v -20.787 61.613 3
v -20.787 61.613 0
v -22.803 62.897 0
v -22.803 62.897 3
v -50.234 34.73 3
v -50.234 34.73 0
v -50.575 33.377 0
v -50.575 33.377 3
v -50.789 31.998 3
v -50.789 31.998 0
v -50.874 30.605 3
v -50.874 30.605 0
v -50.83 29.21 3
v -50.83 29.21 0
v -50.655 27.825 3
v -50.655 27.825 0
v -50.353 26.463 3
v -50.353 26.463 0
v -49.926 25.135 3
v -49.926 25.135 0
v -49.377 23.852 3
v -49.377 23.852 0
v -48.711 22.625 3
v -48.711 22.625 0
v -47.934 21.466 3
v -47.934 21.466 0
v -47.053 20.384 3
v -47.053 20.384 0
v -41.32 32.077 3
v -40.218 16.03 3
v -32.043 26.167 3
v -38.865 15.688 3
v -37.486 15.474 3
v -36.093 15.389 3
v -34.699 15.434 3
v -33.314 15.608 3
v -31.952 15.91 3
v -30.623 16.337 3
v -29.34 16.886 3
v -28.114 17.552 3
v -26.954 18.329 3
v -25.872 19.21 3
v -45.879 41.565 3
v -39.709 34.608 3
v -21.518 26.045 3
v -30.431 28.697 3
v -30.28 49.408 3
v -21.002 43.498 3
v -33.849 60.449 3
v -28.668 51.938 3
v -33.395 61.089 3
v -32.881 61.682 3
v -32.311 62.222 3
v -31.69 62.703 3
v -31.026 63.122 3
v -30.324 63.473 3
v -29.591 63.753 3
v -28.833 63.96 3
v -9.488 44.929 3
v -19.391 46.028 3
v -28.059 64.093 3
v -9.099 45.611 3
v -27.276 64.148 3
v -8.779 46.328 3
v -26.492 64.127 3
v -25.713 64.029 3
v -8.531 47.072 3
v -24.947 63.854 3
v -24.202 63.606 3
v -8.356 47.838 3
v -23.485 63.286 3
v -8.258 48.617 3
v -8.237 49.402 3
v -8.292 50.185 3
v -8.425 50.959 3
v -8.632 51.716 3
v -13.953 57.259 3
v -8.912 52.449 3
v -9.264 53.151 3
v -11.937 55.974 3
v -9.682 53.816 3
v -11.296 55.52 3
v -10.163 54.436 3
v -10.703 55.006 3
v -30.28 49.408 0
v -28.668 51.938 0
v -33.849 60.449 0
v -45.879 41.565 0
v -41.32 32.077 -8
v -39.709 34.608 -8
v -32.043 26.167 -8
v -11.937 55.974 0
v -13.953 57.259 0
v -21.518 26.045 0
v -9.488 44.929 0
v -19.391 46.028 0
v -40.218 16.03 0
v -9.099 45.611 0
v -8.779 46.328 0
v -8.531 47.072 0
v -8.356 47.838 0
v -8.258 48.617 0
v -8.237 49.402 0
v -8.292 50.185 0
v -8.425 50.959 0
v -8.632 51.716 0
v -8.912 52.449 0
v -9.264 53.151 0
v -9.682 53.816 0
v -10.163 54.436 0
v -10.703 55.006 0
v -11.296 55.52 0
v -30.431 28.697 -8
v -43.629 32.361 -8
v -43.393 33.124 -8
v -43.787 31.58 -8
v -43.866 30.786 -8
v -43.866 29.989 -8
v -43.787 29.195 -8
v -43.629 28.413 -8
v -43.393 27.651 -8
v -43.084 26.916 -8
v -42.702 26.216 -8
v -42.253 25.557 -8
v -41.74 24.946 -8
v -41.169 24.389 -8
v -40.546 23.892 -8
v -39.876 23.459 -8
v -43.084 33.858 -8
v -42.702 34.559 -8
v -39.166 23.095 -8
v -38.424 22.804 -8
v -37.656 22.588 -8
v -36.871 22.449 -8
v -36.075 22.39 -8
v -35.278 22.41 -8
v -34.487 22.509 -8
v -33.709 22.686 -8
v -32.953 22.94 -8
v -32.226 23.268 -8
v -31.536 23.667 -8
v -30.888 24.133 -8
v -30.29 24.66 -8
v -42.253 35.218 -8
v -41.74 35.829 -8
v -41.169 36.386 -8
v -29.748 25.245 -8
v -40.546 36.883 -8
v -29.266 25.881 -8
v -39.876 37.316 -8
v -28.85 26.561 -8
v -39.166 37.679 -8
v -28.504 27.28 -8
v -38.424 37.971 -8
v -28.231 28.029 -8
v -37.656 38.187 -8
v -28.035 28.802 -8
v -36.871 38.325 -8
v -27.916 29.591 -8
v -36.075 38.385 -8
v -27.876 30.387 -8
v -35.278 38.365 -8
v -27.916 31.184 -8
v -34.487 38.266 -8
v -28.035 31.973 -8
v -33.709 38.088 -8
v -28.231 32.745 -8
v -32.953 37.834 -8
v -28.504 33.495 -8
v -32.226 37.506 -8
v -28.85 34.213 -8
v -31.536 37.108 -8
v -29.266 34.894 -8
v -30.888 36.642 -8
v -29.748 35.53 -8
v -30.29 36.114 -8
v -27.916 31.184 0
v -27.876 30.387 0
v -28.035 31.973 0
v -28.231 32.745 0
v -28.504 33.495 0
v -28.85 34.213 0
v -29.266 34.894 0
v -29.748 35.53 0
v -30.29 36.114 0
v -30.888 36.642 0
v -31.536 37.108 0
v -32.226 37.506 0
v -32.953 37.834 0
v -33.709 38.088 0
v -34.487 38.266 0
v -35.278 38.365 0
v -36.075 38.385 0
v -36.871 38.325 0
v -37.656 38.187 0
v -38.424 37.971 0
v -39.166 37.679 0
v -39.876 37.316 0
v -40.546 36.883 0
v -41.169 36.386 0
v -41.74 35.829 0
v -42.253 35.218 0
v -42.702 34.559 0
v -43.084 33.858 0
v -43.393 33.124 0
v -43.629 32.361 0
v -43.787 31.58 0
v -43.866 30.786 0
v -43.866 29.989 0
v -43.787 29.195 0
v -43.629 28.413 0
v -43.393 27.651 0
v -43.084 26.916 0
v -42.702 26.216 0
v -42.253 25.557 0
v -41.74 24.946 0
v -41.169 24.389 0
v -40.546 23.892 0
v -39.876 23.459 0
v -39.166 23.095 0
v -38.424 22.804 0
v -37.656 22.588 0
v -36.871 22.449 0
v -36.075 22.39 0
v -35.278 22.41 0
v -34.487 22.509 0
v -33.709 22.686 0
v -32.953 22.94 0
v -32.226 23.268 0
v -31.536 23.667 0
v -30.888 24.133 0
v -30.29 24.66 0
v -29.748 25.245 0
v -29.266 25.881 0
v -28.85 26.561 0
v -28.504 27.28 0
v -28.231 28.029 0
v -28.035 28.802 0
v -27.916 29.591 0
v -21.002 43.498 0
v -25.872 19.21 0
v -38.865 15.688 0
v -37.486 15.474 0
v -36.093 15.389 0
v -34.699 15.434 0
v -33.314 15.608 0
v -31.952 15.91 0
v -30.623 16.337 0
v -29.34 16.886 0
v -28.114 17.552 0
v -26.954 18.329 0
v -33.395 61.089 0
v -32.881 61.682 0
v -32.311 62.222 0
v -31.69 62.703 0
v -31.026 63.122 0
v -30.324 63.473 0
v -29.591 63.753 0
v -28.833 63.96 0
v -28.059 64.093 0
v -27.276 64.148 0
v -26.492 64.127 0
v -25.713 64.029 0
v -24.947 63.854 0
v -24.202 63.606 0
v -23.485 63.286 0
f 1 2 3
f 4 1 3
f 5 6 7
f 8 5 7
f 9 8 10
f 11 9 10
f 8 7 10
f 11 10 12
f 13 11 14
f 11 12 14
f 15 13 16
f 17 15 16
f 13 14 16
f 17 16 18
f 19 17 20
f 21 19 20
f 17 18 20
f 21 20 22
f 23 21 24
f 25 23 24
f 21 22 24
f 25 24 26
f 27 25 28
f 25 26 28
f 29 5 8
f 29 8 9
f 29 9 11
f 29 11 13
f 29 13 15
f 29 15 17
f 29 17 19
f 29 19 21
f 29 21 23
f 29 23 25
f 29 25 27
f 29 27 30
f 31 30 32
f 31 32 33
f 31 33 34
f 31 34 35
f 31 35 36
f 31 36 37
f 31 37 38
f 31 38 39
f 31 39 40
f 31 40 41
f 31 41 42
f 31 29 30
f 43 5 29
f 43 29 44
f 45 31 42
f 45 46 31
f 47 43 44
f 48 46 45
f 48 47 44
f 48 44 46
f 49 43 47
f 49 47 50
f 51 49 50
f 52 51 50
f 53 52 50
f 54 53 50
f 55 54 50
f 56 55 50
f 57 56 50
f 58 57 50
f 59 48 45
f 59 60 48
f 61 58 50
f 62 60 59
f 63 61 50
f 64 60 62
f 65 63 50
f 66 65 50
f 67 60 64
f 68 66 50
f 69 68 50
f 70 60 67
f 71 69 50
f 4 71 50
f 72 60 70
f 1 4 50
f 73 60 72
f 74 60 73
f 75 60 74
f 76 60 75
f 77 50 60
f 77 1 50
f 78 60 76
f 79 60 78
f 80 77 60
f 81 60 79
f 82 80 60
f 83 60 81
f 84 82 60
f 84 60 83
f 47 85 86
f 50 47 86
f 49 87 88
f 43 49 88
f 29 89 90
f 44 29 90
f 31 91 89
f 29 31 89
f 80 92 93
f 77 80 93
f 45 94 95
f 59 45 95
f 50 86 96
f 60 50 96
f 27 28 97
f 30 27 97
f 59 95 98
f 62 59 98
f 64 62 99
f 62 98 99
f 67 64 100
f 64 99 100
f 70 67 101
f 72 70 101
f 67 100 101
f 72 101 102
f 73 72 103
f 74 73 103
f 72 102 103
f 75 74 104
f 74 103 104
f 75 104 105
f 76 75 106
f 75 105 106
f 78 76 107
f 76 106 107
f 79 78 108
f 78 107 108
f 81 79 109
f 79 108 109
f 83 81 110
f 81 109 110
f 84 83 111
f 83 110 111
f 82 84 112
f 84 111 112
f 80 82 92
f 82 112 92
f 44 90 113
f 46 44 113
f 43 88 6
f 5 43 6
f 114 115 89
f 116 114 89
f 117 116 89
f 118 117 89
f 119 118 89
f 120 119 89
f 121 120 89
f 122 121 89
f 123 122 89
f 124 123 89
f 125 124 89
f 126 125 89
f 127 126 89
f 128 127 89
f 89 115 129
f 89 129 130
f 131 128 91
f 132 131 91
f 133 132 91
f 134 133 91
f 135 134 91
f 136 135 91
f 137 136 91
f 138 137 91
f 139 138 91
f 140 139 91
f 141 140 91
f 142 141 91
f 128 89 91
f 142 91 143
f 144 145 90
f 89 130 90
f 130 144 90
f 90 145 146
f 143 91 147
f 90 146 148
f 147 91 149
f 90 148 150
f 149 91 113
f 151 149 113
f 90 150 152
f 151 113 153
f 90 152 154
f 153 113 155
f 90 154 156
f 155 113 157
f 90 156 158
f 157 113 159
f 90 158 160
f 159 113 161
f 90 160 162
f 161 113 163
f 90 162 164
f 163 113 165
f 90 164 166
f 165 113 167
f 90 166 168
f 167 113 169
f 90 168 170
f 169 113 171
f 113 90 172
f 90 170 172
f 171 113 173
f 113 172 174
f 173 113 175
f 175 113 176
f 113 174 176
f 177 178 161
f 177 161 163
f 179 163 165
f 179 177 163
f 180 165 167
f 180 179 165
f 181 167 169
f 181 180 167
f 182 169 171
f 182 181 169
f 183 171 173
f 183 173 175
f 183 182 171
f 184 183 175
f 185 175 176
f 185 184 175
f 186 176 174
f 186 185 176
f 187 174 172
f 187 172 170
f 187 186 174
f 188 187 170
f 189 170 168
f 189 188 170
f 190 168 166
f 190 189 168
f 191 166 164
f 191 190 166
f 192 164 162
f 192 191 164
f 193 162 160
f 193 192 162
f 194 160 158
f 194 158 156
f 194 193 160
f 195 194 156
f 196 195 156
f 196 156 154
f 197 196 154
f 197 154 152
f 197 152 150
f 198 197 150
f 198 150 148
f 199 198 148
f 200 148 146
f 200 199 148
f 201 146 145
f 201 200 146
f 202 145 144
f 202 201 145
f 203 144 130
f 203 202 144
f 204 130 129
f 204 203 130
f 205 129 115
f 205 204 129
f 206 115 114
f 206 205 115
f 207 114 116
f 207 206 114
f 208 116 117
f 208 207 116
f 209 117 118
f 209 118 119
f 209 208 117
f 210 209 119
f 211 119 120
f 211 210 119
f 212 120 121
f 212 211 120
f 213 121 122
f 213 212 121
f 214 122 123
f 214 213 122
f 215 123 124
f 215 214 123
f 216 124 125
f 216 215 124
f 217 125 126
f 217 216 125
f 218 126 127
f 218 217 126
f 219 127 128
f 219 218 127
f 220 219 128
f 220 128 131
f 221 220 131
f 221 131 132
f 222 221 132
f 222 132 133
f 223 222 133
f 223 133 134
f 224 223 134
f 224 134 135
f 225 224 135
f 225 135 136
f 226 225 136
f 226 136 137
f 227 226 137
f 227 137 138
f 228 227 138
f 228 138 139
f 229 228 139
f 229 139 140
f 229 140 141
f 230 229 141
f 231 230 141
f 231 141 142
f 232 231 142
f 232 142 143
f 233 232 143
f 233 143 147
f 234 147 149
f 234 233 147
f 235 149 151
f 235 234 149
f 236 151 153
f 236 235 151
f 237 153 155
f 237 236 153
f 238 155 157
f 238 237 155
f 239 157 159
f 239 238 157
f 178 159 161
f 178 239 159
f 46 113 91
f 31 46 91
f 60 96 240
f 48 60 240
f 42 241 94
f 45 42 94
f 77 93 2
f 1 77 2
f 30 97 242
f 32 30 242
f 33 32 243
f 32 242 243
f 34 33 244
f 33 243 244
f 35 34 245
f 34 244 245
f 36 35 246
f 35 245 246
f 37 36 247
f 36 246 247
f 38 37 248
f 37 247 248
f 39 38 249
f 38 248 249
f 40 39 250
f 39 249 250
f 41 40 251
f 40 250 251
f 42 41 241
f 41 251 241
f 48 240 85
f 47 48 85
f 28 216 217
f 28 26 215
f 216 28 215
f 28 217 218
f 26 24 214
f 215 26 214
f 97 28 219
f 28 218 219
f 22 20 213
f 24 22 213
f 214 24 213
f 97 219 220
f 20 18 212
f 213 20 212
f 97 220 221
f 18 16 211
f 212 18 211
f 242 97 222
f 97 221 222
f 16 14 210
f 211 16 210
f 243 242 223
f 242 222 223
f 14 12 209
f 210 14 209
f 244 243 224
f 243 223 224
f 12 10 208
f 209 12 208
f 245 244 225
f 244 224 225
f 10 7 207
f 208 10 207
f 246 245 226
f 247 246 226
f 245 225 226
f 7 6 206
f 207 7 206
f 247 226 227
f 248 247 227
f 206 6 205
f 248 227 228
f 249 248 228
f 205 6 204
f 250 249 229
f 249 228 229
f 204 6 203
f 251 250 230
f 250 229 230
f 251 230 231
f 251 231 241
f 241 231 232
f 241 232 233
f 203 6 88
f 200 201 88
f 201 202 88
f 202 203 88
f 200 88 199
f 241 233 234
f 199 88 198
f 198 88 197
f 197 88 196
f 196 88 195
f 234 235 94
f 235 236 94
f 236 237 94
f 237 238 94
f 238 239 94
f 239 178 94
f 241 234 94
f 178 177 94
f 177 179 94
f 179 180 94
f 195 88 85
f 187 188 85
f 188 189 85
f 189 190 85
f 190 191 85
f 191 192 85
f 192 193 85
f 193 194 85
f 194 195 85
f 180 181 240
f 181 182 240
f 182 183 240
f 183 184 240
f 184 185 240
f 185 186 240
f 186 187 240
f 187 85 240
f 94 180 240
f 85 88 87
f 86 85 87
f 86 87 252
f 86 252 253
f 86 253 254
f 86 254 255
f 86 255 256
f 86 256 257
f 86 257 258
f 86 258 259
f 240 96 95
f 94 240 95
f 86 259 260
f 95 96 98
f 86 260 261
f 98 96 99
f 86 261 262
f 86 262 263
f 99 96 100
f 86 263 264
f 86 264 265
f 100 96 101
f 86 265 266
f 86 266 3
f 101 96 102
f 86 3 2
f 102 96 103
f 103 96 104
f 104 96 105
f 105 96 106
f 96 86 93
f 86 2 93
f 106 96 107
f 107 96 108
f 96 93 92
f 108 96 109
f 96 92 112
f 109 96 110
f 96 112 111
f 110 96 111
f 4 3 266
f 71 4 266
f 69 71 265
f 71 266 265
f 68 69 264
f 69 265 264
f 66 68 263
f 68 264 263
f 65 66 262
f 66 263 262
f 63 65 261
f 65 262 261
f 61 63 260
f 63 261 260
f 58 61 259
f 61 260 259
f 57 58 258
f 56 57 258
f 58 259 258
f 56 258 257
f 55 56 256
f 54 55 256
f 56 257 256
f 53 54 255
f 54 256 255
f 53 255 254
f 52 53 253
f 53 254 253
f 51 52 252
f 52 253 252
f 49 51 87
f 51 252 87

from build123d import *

# Parameters (mm, degrees)
CROQUIS1_R                 = 8
SALIENTE_EXTRUIR1_DEPTH    = 8
SALIENTE_EXTRUIR2_DEPTH    = 3
CORTAR_EXTRUIR1_DEPTH      = 10
CORTAR_EXTRUIR1_DEPTH_BACK = 10


with BuildPart() as part:
    # Croquis1 → Saliente-Extruir1 (new body)
    with BuildSketch(Plane.XY):
        with Locations((-35.87588422, 30.387347076)):
            Circle(CROQUIS1_R)
    extrude(amount=-SALIENTE_EXTRUIR1_DEPTH)

    # Croquis2 → Saliente-Extruir2 (add)
    with BuildSketch(Plane.XY):
        with BuildLine():
            Line((-33.848986828, 60.448524076), (-45.879424714, 41.56451924))
            Line((-45.879424714, 41.56451924), (-50.233521284, 34.729956653))
            ThreePointArc((-50.233521284, 34.729956653), (-50.520324327, 27.140752867), (-47.053056384, 20.383806582))
            Line((-47.053056384, 20.383806582), (-40.218493797, 16.029710012))
            ThreePointArc((-40.218493797, 16.029710012), (-32.629290011, 15.74290697), (-25.872343726, 19.210174912))
            Line((-25.872343726, 19.210174912), (-21.518247156, 26.044737499))
            Line((-21.518247156, 26.044737499), (-9.48780927, 44.928742335))
            ThreePointArc((-9.48780927, 44.928742335), (-8.42457278, 50.958656113), (-11.93654397, 55.974270768))
            Line((-11.93654397, 55.974270768), (-13.952719889, 57.258716487))
            Line((-13.952719889, 57.258716487), (-20.787282476, 61.612813057))
            Line((-20.787282476, 61.612813057), (-22.803458395, 62.897258775))
            ThreePointArc((-22.803458395, 62.897258775), (-28.833372173, 63.960495266), (-33.848986828, 60.448524076))
        make_face()
    extrude(amount=SALIENTE_EXTRUIR2_DEPTH)

    # Croquis5 → Cortar-Extruir1 (cut, two sides)
    with BuildSketch(Plane.XY) as cortar_extruir1_sk:
        Polygon((-19.390525704, 46.02780209), (-21.002424529, 43.497627753), (-30.279730433, 49.407923445), (-28.667831608, 51.938097782), align=None)
        Polygon((-30.431281855, 28.697286399), (-32.04318068, 26.167112062), (-41.320486584, 32.077407754), (-39.708587759, 34.607582091), align=None)
    extrude(amount=CORTAR_EXTRUIR1_DEPTH, mode=Mode.SUBTRACT)
    extrude(cortar_extruir1_sk.sketch, amount=-CORTAR_EXTRUIR1_DEPTH_BACK, mode=Mode.SUBTRACT)


solid = part.part
